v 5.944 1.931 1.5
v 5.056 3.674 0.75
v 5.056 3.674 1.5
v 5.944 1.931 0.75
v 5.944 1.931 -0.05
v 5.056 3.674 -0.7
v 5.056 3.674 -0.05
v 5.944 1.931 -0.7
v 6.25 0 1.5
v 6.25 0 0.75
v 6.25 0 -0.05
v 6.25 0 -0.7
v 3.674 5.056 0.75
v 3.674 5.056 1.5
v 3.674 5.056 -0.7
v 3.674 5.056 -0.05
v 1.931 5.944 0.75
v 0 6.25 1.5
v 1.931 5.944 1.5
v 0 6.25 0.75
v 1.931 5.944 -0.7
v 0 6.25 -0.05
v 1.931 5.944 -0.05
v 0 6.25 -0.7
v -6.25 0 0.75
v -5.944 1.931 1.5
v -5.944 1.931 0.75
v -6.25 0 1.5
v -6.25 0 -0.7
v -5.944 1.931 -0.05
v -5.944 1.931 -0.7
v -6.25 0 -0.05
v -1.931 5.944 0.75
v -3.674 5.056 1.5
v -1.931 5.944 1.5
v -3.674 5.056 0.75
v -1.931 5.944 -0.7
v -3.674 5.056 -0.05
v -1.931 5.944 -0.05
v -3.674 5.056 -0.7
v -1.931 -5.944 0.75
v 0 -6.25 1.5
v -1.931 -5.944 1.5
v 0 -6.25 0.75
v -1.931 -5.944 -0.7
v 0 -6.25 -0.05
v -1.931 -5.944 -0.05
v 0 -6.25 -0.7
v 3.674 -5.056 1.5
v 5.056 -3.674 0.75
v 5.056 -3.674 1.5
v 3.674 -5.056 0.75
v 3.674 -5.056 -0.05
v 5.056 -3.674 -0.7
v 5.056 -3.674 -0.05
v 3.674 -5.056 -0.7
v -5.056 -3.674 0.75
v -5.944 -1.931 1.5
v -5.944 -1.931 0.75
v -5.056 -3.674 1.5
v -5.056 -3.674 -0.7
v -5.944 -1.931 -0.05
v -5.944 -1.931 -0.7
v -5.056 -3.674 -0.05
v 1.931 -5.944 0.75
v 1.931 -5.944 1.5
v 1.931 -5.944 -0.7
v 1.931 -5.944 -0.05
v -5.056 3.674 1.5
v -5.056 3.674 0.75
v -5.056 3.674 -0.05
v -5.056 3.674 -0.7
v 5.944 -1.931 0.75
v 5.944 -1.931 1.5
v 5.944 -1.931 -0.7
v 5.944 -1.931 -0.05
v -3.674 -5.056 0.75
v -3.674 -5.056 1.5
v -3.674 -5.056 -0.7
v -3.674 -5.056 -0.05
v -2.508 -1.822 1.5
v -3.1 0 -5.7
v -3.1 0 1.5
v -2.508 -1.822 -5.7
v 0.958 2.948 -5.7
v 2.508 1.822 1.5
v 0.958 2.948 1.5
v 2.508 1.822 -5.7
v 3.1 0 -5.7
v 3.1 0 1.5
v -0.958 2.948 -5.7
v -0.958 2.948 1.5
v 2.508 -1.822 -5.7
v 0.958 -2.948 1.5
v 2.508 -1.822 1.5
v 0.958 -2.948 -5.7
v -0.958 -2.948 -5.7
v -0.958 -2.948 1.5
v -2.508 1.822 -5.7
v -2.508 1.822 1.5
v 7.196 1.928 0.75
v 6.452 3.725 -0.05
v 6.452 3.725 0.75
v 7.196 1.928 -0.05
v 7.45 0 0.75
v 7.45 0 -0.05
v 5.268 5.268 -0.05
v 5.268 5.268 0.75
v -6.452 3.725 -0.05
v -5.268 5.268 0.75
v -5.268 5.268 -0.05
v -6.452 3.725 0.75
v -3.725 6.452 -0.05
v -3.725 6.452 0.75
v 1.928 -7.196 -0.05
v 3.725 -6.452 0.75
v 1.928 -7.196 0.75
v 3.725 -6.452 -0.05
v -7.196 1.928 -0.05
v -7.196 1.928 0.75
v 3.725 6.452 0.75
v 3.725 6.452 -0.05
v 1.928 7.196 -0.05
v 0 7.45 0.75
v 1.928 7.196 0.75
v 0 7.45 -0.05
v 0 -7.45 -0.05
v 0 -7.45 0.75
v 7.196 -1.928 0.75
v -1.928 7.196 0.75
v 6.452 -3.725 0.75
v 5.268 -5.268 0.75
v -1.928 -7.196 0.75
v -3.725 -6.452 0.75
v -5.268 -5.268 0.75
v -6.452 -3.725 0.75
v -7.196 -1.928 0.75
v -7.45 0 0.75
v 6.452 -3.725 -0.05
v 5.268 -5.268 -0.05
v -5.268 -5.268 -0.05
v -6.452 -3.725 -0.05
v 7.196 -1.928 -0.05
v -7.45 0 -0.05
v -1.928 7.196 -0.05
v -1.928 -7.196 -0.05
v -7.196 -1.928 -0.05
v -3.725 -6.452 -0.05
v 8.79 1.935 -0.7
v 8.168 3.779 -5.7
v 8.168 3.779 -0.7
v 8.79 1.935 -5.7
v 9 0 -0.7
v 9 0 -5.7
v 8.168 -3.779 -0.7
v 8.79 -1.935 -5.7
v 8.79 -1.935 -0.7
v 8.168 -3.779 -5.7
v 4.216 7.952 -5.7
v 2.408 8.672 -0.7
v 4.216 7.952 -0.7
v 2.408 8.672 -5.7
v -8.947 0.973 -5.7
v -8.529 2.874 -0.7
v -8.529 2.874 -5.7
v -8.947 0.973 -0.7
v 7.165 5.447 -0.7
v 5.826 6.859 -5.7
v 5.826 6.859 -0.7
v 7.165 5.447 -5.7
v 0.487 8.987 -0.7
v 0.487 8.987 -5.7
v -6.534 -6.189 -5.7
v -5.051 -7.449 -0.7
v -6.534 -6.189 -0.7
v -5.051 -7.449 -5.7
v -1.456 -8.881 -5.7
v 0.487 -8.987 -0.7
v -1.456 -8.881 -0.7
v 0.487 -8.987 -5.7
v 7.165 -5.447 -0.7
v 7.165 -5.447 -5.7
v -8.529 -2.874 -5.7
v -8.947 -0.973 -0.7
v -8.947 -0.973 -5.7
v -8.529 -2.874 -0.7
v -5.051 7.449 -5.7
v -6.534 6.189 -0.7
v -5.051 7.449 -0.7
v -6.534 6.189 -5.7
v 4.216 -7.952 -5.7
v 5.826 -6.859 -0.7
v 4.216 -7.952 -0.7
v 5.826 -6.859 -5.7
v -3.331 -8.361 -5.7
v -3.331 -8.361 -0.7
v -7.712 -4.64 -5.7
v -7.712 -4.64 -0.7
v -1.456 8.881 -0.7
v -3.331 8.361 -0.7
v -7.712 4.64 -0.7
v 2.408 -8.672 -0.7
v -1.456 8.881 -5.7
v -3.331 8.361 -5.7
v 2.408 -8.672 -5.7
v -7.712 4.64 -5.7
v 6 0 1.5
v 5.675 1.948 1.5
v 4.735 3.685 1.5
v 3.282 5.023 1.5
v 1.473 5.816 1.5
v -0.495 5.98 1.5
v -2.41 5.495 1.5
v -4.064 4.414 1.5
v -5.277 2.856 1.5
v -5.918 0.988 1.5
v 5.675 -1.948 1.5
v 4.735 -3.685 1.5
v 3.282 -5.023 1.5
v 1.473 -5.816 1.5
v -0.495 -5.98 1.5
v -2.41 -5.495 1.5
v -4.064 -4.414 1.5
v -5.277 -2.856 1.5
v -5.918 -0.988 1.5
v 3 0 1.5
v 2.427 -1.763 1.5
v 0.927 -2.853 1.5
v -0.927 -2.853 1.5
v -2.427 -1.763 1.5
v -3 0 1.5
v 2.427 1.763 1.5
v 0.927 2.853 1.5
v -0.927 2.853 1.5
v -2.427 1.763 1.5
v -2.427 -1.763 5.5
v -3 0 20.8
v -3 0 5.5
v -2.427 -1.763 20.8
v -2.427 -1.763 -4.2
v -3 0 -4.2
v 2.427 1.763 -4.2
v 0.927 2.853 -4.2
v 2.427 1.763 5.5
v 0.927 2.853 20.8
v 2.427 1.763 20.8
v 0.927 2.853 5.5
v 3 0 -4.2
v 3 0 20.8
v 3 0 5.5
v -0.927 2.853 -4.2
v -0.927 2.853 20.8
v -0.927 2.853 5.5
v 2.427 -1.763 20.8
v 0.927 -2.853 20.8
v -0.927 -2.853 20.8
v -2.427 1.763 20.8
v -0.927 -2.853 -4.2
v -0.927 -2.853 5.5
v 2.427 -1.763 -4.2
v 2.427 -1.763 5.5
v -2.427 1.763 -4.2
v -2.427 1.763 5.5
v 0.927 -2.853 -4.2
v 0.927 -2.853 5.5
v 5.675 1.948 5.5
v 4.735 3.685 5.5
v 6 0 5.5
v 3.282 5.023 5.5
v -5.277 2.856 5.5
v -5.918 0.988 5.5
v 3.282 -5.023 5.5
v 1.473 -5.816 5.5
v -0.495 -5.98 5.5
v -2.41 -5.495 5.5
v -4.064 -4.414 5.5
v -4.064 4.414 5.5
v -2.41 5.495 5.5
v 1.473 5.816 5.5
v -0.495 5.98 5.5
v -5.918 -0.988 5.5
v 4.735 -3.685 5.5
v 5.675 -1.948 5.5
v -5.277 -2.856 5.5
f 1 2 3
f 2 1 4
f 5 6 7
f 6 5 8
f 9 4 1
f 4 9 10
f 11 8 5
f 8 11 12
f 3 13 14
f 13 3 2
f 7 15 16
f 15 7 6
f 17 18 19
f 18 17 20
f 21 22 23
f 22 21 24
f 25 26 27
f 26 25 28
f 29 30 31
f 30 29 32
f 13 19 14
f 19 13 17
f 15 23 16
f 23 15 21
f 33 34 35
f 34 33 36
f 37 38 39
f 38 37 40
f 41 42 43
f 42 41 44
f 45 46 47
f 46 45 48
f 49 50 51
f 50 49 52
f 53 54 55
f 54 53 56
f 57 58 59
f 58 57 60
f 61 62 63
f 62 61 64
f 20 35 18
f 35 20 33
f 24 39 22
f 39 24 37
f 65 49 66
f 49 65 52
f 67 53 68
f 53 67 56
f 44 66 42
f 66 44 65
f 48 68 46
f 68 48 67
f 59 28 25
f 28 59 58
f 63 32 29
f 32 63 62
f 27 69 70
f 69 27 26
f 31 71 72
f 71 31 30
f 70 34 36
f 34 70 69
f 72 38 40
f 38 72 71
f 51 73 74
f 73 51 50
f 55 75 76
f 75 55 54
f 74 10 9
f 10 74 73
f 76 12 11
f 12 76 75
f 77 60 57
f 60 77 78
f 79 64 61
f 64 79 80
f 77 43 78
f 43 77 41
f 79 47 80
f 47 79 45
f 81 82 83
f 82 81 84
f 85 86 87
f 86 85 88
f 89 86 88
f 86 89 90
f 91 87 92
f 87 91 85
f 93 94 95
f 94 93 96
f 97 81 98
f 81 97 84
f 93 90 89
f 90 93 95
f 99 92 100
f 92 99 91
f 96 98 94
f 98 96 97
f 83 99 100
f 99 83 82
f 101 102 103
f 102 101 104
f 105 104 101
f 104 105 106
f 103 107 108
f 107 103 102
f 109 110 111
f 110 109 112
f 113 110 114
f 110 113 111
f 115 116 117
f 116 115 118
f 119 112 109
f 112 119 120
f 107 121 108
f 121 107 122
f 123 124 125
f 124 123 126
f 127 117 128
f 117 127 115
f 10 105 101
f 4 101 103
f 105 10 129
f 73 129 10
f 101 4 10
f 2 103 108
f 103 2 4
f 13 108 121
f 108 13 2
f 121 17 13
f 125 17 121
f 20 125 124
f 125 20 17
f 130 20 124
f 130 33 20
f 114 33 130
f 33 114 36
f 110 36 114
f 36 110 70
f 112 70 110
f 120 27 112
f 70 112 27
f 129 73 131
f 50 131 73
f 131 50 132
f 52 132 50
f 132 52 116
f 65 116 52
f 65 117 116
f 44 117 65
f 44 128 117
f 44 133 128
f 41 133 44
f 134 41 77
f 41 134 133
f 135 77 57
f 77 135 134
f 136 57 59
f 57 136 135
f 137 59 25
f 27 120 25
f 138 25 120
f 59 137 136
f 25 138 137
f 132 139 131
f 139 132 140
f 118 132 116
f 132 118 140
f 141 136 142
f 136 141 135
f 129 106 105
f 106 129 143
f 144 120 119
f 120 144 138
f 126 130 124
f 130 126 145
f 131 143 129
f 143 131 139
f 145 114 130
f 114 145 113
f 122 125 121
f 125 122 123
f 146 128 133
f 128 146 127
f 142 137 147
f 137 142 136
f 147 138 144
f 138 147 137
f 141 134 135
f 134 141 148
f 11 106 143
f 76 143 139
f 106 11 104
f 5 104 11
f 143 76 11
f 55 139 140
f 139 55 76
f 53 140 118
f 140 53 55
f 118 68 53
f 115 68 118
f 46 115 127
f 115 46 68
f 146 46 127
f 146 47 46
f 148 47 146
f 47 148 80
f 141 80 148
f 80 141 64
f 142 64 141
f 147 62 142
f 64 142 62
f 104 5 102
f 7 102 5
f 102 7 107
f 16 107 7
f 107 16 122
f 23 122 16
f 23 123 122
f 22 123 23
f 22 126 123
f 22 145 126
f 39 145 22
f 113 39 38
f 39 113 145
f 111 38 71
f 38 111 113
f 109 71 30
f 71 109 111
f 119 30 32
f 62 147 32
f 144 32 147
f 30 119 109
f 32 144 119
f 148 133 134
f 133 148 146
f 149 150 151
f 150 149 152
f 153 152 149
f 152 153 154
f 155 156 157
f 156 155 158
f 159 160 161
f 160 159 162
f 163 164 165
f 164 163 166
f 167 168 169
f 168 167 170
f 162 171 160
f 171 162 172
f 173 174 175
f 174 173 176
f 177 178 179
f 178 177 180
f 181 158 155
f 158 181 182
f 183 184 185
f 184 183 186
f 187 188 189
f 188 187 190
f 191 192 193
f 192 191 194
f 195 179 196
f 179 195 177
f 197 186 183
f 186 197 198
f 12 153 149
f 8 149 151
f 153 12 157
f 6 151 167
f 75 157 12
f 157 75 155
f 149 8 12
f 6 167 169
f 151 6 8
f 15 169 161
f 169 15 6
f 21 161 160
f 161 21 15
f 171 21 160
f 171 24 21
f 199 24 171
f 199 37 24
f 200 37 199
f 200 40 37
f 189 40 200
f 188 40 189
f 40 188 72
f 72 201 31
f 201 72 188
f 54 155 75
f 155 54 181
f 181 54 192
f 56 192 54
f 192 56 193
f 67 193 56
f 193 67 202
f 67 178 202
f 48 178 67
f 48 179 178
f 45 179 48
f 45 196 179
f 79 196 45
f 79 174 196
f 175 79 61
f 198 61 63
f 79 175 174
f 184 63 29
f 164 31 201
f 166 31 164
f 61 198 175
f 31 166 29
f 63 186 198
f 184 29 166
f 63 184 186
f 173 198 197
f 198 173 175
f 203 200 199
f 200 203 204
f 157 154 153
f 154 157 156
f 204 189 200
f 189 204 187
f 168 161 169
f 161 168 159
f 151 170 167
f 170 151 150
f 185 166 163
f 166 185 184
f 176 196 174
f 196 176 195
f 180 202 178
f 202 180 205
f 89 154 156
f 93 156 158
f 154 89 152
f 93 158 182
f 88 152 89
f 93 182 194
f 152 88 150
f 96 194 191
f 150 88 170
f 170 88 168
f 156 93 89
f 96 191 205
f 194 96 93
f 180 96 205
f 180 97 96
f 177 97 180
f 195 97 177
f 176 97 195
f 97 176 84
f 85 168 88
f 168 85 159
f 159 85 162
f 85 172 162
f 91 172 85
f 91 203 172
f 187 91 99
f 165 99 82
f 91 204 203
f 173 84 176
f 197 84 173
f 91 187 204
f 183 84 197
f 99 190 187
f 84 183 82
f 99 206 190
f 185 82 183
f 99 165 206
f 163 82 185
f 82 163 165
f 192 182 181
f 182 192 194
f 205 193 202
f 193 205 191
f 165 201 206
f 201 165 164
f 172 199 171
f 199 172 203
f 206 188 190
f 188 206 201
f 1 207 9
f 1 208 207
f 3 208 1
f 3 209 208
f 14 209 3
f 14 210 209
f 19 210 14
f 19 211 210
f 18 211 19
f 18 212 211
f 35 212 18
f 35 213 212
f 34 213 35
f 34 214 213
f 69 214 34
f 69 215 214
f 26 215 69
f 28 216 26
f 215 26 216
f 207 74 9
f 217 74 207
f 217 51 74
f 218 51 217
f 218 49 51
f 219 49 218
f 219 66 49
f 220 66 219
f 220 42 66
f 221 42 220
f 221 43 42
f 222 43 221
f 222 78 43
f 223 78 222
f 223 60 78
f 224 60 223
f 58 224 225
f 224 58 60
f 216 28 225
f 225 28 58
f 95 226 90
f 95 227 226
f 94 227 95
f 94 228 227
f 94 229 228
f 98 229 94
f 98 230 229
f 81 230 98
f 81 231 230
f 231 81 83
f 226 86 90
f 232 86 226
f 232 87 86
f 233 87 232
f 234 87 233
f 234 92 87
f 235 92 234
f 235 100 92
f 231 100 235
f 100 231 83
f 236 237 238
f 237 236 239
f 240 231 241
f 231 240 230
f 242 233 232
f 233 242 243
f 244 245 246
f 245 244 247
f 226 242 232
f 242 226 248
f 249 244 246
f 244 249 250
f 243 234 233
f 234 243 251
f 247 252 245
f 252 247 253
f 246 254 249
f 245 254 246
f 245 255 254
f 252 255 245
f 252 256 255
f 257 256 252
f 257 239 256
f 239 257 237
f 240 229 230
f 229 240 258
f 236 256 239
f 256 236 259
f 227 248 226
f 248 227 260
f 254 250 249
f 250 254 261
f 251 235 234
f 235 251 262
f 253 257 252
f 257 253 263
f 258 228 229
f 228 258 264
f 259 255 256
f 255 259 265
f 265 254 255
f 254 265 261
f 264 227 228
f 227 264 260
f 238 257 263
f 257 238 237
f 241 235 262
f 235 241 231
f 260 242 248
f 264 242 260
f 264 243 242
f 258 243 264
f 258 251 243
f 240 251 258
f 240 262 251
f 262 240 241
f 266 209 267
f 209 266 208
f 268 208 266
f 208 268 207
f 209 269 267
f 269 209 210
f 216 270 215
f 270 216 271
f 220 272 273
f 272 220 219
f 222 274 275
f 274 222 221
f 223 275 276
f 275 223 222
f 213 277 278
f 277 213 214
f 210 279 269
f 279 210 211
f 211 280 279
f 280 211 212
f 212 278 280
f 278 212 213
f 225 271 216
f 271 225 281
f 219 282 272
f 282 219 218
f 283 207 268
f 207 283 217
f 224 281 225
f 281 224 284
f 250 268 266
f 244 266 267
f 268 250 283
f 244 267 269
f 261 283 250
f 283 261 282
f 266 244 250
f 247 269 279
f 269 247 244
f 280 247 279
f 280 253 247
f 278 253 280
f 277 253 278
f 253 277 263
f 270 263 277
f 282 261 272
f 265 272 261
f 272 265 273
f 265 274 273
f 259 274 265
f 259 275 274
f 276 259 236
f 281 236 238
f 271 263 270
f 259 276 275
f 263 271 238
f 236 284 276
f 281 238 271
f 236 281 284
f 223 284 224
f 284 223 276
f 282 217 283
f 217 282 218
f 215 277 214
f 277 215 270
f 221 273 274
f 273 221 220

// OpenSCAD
// Parameters
inner_hole_diameter_mm = 6; //[3:12:0.1]
outer_diameter_mm = 12.5; //[6.25:25:0.1]
thickness_mm = 1.5; //[0.75:3:0.05]
overlap_mm = 0.8; //[0.5:2:0.1]
hole_clearance_mm = 0.2; //[0:0.6:0.05]
grommet_lip_radial_mm = 1.2; //[0.6:2.4:0.1]
grommet_lip_height_mm = 0.8; //[0.4:1.6:0.05]
grommet_inner_relief_mm = 0.6; //[0.2:1.5:0.05]
nut_outer_diameter_mm = 18; //[9:36:0.1]
nut_thickness_mm = 5; //[2.5:10:0.1]
screw_shank_diameter_mm = 6; //[3:12:0.1]
screw_length_mm = 25; //[12.5:50:0.5]
screw_head_diameter_mm = 12; //[6:24:0.1]
screw_head_height_mm = 4; //[2:8:0.1]

// Washer with through-hole
module washer_body() {
  color("Silver") difference() {
    cylinder(r=outer_diameter_mm/2, h=thickness_mm, center=true);
    translate([0, 0, 0])
      cylinder(r=(inner_hole_diameter_mm + hole_clearance_mm)/2, h=thickness_mm + 2*overlap_mm, center=true);
  }
}

// Round Grommet Top
module round_grommet_top() {
  color([0.2, 0.2, 0.2]) difference() {
    translate([0, 0, thickness_mm/2 + grommet_lip_height_mm/2 - overlap_mm])
      cylinder(r=outer_diameter_mm/2 + grommet_lip_radial_mm, h=grommet_lip_height_mm, center=true);
    translate([0, 0, thickness_mm/2 + grommet_lip_height_mm/2 - overlap_mm])
      cylinder(r=(inner_hole_diameter_mm + hole_clearance_mm)/2 + grommet_inner_relief_mm, h=grommet_lip_height_mm + 2*overlap_mm, center=true);
  }
}

// Round Grommet Assembly
module round_grommet_assembly() {
  union() {
    washer_body();
    round_grommet_top();
  }
}

// Nut and Washer
module nut_and_washer() {
  color("DimGray") union() {
    washer_body();
    translate([0, 0, -(thickness_mm/2 + nut_thickness_mm/2 - overlap_mm)])
      difference() {
        cylinder(r=nut_outer_diameter_mm/2, h=nut_thickness_mm, center=true);
        cylinder(r=(inner_hole_diameter_mm + hole_clearance_mm)/2, h=nut_thickness_mm + 2*overlap_mm, center=true);
      }
  }
}

// Screw and Washer
module screw_and_washer() {
  color("Black") union() {
    washer_body();
    translate([0, 0, screw_length_mm/2 - (thickness_mm/2 + nut_thickness_mm - overlap_mm)])
      cylinder(r=screw_shank_diameter_mm/2, h=screw_length_mm, center=true);
    translate([0, 0, thickness_mm/2 + grommet_lip_height_mm + screw_head_height_mm/2 - overlap_mm])
      cylinder(r=screw_head_diameter_mm/2, h=screw_head_height_mm, center=true);
  }
}

// Final Assembly
module assembly() {
  round_grommet_assembly();
  translate([0, 0, -thickness_mm/2])
    nut_and_washer();
  translate([0, 0, thickness_mm/2])
    screw_and_washer();
}

assembly();
